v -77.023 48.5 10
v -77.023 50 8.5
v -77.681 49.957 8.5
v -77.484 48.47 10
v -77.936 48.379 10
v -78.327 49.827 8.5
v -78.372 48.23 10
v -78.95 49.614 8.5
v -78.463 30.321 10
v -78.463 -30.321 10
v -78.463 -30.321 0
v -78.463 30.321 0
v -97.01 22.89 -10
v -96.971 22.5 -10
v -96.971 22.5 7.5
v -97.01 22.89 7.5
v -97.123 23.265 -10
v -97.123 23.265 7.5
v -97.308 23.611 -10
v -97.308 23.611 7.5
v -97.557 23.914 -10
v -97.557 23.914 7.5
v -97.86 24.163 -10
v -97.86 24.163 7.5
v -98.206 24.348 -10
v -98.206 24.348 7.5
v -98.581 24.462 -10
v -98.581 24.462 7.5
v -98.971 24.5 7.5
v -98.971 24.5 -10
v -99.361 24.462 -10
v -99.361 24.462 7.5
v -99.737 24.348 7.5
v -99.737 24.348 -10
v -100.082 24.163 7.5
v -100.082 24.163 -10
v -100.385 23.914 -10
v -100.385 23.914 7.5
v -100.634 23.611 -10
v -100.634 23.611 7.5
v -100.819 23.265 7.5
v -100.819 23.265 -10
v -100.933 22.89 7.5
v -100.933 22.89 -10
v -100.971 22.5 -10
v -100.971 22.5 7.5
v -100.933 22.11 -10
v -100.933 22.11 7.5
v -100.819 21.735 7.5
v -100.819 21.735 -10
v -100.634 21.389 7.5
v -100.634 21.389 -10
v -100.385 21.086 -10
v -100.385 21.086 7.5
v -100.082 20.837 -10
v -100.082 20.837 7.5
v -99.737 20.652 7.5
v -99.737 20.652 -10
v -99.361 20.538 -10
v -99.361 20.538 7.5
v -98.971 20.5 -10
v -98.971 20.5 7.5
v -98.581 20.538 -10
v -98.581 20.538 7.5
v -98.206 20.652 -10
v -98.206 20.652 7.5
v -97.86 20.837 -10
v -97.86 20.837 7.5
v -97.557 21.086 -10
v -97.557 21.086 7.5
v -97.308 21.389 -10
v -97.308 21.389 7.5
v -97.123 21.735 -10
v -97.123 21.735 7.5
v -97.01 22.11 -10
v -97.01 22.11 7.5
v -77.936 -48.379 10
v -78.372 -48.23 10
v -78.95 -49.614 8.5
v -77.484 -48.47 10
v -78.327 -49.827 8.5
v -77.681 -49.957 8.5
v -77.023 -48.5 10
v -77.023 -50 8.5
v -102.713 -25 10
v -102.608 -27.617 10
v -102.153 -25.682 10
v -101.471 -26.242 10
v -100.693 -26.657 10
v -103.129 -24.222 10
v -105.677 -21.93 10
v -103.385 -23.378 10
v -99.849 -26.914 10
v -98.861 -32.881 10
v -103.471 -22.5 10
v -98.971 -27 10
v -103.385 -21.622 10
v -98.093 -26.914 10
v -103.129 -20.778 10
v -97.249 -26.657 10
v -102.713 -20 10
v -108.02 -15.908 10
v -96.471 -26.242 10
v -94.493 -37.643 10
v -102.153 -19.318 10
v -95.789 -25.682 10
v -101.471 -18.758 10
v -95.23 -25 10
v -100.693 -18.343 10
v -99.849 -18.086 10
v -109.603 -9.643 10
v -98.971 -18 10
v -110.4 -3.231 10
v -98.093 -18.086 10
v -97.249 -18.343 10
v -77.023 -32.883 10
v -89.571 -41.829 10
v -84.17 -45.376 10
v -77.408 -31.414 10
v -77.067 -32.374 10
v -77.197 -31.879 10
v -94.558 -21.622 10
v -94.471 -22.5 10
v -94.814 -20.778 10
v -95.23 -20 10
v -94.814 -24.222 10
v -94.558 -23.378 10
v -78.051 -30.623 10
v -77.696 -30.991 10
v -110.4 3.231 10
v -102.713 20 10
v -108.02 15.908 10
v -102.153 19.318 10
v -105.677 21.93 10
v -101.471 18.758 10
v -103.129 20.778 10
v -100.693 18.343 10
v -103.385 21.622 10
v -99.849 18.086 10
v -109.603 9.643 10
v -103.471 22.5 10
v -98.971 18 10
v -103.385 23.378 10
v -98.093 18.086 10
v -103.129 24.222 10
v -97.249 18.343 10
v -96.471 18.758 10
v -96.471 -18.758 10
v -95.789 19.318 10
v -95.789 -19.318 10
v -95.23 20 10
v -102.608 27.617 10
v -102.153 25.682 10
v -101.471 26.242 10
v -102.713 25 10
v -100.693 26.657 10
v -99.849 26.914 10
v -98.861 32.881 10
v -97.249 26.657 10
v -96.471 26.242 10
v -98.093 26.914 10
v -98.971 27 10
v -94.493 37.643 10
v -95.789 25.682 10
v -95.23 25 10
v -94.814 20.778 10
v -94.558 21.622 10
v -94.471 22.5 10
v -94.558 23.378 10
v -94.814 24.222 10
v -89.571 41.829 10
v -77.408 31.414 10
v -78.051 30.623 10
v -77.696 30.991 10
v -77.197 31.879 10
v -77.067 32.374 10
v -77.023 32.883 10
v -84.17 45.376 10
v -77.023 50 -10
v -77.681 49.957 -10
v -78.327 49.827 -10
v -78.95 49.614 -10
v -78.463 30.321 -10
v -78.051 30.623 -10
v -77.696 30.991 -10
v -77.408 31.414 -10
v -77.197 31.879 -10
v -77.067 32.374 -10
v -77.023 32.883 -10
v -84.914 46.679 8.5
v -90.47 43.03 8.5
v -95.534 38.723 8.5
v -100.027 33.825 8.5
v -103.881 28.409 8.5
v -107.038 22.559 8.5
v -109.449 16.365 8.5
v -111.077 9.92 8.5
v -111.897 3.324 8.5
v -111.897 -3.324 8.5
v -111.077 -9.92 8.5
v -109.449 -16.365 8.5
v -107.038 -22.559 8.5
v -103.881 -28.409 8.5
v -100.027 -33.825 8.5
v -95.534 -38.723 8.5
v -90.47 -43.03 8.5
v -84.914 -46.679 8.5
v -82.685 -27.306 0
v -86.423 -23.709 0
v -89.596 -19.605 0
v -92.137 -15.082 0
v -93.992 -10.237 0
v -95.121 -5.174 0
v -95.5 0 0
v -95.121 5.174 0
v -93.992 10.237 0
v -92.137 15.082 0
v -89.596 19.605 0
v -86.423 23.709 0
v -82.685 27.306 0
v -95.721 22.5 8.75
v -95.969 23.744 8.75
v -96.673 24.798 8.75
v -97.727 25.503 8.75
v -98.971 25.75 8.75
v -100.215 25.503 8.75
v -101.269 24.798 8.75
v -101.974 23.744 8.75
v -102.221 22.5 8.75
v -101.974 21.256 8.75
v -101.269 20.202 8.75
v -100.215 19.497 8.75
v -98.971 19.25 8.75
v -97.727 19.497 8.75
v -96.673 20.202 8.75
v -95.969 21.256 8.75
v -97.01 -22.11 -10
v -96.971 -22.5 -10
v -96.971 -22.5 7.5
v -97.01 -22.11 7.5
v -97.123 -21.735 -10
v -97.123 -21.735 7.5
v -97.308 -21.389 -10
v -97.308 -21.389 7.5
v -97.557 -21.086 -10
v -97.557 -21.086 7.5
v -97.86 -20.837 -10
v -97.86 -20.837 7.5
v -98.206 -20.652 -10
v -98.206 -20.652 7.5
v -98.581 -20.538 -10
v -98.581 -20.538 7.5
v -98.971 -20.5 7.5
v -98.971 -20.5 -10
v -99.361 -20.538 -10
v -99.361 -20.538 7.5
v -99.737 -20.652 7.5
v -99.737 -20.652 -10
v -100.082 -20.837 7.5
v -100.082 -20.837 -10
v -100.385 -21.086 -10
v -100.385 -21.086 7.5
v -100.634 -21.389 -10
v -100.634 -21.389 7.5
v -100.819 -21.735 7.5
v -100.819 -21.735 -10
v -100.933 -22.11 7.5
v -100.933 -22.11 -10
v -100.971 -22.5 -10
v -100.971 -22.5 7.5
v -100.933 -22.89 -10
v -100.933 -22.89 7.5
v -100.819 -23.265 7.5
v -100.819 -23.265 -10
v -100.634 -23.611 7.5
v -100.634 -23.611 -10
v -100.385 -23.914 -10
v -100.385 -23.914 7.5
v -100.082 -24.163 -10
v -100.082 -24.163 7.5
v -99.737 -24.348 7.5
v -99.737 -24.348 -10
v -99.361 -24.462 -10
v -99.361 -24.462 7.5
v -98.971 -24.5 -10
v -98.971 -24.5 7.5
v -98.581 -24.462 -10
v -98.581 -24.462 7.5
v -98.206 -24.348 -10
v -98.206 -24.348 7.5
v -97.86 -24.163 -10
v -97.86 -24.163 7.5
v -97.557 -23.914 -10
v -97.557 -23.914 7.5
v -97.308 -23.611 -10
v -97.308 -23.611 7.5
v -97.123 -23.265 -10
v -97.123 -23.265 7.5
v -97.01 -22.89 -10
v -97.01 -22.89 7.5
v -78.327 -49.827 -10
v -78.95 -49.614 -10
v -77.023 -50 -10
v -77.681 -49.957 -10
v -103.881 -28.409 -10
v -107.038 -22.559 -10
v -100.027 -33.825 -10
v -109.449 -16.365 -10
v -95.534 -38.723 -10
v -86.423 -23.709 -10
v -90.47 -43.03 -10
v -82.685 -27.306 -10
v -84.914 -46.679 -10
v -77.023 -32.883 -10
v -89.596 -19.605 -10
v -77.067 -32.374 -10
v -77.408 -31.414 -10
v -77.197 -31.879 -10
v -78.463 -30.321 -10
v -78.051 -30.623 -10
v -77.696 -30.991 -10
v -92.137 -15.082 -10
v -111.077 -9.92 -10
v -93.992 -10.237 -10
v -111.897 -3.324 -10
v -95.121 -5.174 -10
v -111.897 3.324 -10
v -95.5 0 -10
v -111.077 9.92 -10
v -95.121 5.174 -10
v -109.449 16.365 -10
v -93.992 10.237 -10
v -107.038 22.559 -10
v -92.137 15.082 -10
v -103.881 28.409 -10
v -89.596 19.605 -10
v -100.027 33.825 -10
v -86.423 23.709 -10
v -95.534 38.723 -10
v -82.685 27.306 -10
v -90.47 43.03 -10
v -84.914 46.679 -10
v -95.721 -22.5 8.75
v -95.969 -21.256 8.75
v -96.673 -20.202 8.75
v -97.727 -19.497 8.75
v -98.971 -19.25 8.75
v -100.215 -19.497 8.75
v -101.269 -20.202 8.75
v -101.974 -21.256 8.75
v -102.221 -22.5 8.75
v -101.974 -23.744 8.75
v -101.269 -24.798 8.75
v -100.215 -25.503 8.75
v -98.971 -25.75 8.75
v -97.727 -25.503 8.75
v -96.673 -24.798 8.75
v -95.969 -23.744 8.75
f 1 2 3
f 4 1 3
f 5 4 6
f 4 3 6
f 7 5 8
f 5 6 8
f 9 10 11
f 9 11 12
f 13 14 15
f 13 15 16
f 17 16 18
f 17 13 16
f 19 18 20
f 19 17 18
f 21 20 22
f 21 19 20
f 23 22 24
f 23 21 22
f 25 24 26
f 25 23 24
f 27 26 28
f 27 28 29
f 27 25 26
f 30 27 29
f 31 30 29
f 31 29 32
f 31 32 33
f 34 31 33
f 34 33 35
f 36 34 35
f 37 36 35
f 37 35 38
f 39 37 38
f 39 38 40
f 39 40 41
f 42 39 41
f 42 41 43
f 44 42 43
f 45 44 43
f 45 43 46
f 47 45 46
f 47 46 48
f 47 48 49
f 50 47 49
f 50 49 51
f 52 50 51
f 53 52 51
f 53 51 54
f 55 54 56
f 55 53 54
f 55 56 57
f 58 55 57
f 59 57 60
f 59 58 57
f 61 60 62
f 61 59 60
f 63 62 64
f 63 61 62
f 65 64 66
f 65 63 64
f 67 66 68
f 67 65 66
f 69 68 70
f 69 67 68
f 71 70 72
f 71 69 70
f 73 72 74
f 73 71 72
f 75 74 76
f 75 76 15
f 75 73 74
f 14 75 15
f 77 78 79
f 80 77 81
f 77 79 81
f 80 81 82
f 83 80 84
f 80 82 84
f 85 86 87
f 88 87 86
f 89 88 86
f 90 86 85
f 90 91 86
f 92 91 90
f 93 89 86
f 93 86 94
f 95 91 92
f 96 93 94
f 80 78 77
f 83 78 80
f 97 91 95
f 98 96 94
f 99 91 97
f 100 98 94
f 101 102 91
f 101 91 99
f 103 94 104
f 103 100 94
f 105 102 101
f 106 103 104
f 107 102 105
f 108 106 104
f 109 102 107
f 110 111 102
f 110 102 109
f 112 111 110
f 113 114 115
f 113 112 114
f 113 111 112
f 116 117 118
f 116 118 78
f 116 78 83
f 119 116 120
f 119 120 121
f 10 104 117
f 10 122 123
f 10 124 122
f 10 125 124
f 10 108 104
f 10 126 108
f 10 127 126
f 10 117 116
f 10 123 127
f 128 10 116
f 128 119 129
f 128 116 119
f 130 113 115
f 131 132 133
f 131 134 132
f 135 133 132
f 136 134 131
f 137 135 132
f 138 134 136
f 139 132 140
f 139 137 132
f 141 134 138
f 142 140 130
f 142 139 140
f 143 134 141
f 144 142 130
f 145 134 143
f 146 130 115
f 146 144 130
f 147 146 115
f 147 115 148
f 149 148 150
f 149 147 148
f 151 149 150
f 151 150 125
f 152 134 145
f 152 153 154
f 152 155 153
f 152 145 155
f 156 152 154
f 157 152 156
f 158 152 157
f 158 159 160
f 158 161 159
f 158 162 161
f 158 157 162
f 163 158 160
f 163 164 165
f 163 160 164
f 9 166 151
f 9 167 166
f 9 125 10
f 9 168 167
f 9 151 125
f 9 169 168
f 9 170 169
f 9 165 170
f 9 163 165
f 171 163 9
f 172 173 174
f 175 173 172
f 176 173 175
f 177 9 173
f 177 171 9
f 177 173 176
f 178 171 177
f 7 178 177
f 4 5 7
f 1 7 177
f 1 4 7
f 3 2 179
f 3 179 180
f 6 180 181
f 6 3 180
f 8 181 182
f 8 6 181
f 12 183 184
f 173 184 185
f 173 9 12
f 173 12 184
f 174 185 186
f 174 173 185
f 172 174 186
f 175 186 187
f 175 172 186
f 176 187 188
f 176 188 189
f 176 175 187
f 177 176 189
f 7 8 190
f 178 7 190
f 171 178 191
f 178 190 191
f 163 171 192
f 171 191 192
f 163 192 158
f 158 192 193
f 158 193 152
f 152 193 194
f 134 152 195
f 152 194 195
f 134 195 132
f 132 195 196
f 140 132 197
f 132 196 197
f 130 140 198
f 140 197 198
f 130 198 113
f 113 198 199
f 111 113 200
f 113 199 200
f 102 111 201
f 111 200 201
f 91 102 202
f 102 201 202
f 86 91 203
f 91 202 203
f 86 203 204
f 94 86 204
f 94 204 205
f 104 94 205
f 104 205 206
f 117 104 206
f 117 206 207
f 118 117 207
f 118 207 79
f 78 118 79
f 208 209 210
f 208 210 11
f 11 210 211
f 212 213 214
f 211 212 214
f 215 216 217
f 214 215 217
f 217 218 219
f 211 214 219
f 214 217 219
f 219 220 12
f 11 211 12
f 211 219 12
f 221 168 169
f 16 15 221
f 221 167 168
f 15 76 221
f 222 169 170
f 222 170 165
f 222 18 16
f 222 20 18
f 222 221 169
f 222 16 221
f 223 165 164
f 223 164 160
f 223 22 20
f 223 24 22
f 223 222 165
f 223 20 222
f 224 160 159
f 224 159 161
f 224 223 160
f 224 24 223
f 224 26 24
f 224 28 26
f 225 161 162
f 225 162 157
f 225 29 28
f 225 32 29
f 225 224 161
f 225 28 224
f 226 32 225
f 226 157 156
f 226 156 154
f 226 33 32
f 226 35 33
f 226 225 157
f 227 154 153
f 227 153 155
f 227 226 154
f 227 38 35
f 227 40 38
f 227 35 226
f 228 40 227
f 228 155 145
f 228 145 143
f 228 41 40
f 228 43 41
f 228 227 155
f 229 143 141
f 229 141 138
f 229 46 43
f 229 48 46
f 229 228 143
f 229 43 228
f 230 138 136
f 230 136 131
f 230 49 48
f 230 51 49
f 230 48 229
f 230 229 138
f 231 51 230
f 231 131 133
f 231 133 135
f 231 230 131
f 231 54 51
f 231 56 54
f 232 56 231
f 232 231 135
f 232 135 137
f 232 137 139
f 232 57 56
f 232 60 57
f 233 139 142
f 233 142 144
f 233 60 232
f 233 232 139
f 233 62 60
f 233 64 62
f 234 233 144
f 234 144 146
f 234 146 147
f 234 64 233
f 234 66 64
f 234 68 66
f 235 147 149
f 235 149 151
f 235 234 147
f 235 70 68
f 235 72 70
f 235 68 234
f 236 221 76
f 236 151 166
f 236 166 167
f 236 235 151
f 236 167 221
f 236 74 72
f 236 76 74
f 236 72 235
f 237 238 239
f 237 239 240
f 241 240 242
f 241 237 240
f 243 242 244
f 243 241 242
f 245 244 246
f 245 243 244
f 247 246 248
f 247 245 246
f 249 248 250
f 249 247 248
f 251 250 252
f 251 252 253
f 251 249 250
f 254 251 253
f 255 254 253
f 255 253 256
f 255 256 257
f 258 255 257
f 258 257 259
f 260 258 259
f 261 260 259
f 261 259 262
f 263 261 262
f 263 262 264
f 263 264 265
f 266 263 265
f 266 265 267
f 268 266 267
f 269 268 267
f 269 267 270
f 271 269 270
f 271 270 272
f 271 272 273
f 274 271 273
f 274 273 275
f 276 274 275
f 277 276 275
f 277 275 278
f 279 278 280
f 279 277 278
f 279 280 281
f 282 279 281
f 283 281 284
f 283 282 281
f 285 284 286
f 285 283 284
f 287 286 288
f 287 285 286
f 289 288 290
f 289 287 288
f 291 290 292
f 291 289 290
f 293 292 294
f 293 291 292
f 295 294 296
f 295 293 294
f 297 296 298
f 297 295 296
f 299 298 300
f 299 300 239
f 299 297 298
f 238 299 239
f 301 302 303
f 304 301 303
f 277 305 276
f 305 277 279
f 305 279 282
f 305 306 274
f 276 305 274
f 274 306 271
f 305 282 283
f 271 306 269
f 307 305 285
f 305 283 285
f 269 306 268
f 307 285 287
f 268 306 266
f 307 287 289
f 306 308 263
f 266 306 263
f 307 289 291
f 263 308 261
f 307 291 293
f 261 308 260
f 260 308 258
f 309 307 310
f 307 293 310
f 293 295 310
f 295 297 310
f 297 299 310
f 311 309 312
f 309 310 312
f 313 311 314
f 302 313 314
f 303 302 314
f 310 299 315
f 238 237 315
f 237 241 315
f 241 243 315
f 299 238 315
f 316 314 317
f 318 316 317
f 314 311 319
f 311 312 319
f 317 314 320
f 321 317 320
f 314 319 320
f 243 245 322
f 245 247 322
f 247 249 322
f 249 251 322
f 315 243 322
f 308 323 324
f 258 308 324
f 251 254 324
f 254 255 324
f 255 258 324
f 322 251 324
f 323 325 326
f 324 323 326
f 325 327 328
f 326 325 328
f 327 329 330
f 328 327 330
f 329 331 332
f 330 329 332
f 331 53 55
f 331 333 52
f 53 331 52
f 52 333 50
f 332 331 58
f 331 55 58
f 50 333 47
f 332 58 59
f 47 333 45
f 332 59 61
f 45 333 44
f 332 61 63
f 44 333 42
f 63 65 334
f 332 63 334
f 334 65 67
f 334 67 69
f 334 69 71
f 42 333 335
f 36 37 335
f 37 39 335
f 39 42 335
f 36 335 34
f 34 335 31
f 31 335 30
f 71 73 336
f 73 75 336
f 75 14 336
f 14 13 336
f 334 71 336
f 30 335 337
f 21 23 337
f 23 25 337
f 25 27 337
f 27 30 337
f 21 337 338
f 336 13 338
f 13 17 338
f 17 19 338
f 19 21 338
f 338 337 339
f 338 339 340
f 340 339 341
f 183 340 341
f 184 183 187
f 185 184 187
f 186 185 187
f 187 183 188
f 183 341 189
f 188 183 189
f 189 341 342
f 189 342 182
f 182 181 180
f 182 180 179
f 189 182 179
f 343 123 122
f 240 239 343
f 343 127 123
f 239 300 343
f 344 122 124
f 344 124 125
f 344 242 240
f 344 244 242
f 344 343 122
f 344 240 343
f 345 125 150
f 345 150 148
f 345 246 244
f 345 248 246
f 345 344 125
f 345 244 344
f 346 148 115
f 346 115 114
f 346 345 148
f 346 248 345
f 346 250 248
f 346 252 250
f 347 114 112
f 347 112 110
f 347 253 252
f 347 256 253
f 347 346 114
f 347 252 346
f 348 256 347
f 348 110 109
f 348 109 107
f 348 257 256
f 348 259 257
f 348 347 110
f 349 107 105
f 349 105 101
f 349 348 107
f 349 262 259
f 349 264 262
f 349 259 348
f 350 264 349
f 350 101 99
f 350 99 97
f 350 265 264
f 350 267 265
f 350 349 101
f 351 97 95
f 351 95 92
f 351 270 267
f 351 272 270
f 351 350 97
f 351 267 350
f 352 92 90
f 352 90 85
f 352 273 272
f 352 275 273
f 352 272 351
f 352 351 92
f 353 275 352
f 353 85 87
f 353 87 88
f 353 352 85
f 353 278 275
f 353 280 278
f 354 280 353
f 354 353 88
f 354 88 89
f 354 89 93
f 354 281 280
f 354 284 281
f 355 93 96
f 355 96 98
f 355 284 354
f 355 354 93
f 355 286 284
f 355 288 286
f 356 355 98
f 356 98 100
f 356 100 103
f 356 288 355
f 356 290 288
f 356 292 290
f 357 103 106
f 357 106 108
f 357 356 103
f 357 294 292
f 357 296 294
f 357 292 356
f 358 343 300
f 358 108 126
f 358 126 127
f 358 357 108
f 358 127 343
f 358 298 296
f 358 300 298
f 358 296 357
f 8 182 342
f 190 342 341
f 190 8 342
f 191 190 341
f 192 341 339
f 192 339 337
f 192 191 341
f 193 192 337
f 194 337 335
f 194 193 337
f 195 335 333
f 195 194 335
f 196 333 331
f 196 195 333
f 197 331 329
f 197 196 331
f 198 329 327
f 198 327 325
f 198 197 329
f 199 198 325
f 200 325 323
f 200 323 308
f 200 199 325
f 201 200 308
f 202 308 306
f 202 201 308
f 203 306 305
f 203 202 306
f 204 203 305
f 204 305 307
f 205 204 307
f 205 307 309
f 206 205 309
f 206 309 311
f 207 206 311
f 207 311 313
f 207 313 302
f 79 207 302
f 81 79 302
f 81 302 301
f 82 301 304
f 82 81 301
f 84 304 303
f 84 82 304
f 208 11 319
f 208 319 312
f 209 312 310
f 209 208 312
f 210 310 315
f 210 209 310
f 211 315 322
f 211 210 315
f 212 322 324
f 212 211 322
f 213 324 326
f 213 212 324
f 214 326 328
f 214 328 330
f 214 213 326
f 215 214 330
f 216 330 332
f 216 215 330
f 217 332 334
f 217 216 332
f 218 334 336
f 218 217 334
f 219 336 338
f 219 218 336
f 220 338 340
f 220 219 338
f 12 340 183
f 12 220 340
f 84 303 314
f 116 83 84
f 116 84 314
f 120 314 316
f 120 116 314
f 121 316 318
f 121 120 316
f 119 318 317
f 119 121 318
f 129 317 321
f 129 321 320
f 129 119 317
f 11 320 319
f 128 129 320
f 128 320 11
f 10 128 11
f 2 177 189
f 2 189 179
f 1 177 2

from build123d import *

# Parameters (mm, degrees)
SKETCH_1_R      = 2
EXTRUDE_1_DEPTH = 10
CHAMFER_1_SIZE  = 2.5
CHAMFER_2_SIZE  = 1.5
EXTRUDE_START   = 10
EXTRUDE_2_DEPTH = 10


with BuildPart() as part:
    # 草图1 → 凸台-拉伸1 (new, symmetric)
    with BuildSketch(Plane.XY):
        with BuildLine():
            Line((-77.023496261, 32.883272305), (-77.023496261, 50))
            ThreePointArc((-77.023496261, 50), (-78.005849606, 49.902548511), (-78.949910233, 49.613992762))
            ThreePointArc((-78.949910233, 49.613992762), (-112, 0), (-78.949910233, -49.613992762))
            ThreePointArc((-78.949910233, -49.613992762), (-78.005849606, -49.902548511), (-77.023496261, -50))
            Line((-77.023496261, -50), (-77.023496261, -32.883272305))
            ThreePointArc((-77.023496261, -32.883272305), (-77.40807877, -31.413717493), (-78.463223825, -30.320939398))
            ThreePointArc((-78.463223825, -30.320939398), (-95.5, 0), (-78.463223825, 30.320939398))
            ThreePointArc((-78.463223825, 30.320939398), (-77.40807877, 31.413717493), (-77.023496261, 32.883272305))
        make_face()
        with Locations((-98.97114317, 22.5)):
            Circle(SKETCH_1_R, mode=Mode.SUBTRACT)
        with Locations((-98.97114317, -22.5)):
            Circle(SKETCH_1_R, mode=Mode.SUBTRACT)
    extrude(amount=EXTRUDE_1_DEPTH, both=True)

    # 倒角1
    chamfer_1_edges = [part.edges().sort_by_distance(p)[0] for p in [
        (-100.97114317, 22.5, 10),
        (-100.97114317, -22.5, 10),
    ]]
    chamfer(chamfer_1_edges, length=CHAMFER_1_SIZE)

    # 倒角2
    chamfer_2_edges = [part.edges().sort_by_distance(p)[0] for p in [
        (-78.005849606, 49.902548511, 10),
        (-112, 0, 10),
        (-78.005849606, -49.902548511, 10),
    ]]
    chamfer(chamfer_2_edges, length=CHAMFER_2_SIZE)

    # 草图4 → 凸台-拉伸2 (add)
    with BuildSketch(Plane.XY.offset(EXTRUDE_START)):
        with BuildLine():
            Line((-78.463223825, -30.320939398), (-78.463223825, 30.320939398))
            ThreePointArc((-78.463223825, 30.320939398), (-95.5, 0), (-78.463223825, -30.320939398))
        make_face()
    extrude(amount=-EXTRUDE_2_DEPTH)


solid = part.part
